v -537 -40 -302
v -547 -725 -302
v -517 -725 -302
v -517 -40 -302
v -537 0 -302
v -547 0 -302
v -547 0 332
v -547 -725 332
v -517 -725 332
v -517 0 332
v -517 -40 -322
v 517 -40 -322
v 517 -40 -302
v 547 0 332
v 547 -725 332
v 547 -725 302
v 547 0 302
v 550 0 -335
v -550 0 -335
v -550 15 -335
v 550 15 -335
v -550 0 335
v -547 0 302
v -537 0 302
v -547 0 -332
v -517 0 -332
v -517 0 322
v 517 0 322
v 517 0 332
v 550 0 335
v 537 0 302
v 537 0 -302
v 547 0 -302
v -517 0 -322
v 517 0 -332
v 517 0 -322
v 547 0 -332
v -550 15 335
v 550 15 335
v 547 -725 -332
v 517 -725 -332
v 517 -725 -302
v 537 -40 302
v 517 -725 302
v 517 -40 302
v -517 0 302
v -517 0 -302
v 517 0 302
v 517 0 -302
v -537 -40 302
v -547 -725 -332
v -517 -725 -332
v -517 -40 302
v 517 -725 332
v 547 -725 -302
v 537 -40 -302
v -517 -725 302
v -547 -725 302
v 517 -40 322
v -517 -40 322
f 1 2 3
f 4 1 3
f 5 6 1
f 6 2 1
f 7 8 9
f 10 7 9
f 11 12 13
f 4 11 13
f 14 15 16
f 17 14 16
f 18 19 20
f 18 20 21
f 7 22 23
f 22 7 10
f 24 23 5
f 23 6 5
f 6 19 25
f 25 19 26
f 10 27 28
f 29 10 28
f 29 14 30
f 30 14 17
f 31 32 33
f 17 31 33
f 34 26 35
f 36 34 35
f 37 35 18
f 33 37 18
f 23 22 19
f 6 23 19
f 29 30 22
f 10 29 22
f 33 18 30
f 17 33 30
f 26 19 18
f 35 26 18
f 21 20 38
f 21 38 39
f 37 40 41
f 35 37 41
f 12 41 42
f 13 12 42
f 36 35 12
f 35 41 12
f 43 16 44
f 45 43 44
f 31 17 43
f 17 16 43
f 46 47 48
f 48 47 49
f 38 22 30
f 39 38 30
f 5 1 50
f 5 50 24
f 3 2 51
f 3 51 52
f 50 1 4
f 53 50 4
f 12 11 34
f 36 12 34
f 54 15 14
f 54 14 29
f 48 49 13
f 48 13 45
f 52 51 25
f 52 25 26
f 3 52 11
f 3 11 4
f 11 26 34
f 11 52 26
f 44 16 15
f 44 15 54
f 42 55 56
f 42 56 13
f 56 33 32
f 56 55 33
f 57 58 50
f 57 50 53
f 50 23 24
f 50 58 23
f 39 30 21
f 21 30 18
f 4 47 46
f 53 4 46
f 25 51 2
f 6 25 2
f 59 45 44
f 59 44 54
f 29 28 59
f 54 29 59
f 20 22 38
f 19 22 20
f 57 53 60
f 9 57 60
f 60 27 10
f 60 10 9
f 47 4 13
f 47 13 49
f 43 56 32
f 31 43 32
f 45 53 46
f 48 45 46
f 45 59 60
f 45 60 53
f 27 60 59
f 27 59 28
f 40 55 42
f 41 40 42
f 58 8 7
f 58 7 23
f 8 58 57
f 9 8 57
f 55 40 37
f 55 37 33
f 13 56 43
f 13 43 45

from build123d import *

# Parameters (mm, degrees)
SKETCH1_W               = 1100
SKETCH1_H               = 670
BOSS_EXTRUDE1_DEPTH     = 15
SKETCH2_W               = 30
SKETCH2_H               = 30
BOSS_EXTRUDE2_DEPTH     = 725
MIRROR2_COPY_1_SKETCH_W = 30
MIRROR2_COPY_1_SKETCH_H = 30
MIRROR2_COPY_1_DEPTH    = 725
BOSS_EXTRUDE3_REACH     = 1112.808
SKETCH3_W               = 20
SKETCH3_H               = 40
BOSS_EXTRUDE4_REACH     = 1334.794
SKETCH4_W               = 20
SKETCH4_H               = 40


with BuildPart() as part:
    # Sketch1 → Boss-Extrude1 (new body)
    with BuildSketch(Plane(origin=(0, 0, 0), x_dir=(1, 0, 0), z_dir=(0, 1, 0))):
        Rectangle(SKETCH1_W, SKETCH1_H)
    extrude(amount=BOSS_EXTRUDE1_DEPTH)

    # Sketch2 → Boss-Extrude2 (add)
    with BuildSketch(Plane(origin=(0, 0, 0), x_dir=(1, 0, 0), z_dir=(0, 1, 0))):
        with Locations((-532, -317)):
            Rectangle(SKETCH2_W, SKETCH2_H)
    boss_extrude2 = extrude(amount=-BOSS_EXTRUDE2_DEPTH)

    # Mirror1: Boss-Extrude2 across plane
    add(boss_extrude2.mirror(Plane.XY))

    # Mirror2: Boss-Extrude2 across plane
    add(boss_extrude2.mirror(Plane(origin=(0, 0, 0), x_dir=(0, 0, 1), z_dir=(1, 0, 0))))

    # Mirror2 copy 1 sketch → Mirror2 copy 1 (add)
    with BuildSketch(Plane(origin=(0, 0, 0), x_dir=(-1, 0, 0), z_dir=(0, 1, 0))):
        with Locations((-532, -317)):
            Rectangle(MIRROR2_COPY_1_SKETCH_W, MIRROR2_COPY_1_SKETCH_H)
    extrude(amount=-MIRROR2_COPY_1_DEPTH)

    # Sketch3 → Boss-Extrude3 (add, up to next)
    with BuildSketch(Plane.XY.offset(-302), mode=Mode.PRIVATE) as boss_extrude3_sk1:
        with Locations((-527, -20)):
            Rectangle(SKETCH3_W, SKETCH3_H)
    boss_extrude3_tool1 = extrude(boss_extrude3_sk1.sketch, amount=BOSS_EXTRUDE3_REACH, mode=Mode.PRIVATE) - part.part
    boss_extrude3 = boss_extrude3_tool1.solids().sort_by_distance((-527, -20, -302))[0]
    add(boss_extrude3)

    # Mirror3: Boss-Extrude3 across plane
    add(boss_extrude3.mirror(Plane(origin=(0, 0, 0), x_dir=(0, 0, 1), z_dir=(1, 0, 0))))

    # Sketch4 → Boss-Extrude4 (add, up to next)
    with BuildSketch(Plane(origin=(-517, 0, 0), x_dir=(0, 0, -1), z_dir=(1, 0, 0)), mode=Mode.PRIVATE) as boss_extrude4_sk1:
        with Locations((-312, -20)):
            Rectangle(SKETCH4_W, SKETCH4_H)
    boss_extrude4_tool1 = extrude(boss_extrude4_sk1.sketch, amount=BOSS_EXTRUDE4_REACH, mode=Mode.PRIVATE) - part.part
    boss_extrude4 = boss_extrude4_tool1.solids().sort_by_distance((-517, -20, 312))[0]
    add(boss_extrude4)

    # Mirror4: Boss-Extrude4 across plane
    add(boss_extrude4.mirror(Plane.XY))


solid = part.part
